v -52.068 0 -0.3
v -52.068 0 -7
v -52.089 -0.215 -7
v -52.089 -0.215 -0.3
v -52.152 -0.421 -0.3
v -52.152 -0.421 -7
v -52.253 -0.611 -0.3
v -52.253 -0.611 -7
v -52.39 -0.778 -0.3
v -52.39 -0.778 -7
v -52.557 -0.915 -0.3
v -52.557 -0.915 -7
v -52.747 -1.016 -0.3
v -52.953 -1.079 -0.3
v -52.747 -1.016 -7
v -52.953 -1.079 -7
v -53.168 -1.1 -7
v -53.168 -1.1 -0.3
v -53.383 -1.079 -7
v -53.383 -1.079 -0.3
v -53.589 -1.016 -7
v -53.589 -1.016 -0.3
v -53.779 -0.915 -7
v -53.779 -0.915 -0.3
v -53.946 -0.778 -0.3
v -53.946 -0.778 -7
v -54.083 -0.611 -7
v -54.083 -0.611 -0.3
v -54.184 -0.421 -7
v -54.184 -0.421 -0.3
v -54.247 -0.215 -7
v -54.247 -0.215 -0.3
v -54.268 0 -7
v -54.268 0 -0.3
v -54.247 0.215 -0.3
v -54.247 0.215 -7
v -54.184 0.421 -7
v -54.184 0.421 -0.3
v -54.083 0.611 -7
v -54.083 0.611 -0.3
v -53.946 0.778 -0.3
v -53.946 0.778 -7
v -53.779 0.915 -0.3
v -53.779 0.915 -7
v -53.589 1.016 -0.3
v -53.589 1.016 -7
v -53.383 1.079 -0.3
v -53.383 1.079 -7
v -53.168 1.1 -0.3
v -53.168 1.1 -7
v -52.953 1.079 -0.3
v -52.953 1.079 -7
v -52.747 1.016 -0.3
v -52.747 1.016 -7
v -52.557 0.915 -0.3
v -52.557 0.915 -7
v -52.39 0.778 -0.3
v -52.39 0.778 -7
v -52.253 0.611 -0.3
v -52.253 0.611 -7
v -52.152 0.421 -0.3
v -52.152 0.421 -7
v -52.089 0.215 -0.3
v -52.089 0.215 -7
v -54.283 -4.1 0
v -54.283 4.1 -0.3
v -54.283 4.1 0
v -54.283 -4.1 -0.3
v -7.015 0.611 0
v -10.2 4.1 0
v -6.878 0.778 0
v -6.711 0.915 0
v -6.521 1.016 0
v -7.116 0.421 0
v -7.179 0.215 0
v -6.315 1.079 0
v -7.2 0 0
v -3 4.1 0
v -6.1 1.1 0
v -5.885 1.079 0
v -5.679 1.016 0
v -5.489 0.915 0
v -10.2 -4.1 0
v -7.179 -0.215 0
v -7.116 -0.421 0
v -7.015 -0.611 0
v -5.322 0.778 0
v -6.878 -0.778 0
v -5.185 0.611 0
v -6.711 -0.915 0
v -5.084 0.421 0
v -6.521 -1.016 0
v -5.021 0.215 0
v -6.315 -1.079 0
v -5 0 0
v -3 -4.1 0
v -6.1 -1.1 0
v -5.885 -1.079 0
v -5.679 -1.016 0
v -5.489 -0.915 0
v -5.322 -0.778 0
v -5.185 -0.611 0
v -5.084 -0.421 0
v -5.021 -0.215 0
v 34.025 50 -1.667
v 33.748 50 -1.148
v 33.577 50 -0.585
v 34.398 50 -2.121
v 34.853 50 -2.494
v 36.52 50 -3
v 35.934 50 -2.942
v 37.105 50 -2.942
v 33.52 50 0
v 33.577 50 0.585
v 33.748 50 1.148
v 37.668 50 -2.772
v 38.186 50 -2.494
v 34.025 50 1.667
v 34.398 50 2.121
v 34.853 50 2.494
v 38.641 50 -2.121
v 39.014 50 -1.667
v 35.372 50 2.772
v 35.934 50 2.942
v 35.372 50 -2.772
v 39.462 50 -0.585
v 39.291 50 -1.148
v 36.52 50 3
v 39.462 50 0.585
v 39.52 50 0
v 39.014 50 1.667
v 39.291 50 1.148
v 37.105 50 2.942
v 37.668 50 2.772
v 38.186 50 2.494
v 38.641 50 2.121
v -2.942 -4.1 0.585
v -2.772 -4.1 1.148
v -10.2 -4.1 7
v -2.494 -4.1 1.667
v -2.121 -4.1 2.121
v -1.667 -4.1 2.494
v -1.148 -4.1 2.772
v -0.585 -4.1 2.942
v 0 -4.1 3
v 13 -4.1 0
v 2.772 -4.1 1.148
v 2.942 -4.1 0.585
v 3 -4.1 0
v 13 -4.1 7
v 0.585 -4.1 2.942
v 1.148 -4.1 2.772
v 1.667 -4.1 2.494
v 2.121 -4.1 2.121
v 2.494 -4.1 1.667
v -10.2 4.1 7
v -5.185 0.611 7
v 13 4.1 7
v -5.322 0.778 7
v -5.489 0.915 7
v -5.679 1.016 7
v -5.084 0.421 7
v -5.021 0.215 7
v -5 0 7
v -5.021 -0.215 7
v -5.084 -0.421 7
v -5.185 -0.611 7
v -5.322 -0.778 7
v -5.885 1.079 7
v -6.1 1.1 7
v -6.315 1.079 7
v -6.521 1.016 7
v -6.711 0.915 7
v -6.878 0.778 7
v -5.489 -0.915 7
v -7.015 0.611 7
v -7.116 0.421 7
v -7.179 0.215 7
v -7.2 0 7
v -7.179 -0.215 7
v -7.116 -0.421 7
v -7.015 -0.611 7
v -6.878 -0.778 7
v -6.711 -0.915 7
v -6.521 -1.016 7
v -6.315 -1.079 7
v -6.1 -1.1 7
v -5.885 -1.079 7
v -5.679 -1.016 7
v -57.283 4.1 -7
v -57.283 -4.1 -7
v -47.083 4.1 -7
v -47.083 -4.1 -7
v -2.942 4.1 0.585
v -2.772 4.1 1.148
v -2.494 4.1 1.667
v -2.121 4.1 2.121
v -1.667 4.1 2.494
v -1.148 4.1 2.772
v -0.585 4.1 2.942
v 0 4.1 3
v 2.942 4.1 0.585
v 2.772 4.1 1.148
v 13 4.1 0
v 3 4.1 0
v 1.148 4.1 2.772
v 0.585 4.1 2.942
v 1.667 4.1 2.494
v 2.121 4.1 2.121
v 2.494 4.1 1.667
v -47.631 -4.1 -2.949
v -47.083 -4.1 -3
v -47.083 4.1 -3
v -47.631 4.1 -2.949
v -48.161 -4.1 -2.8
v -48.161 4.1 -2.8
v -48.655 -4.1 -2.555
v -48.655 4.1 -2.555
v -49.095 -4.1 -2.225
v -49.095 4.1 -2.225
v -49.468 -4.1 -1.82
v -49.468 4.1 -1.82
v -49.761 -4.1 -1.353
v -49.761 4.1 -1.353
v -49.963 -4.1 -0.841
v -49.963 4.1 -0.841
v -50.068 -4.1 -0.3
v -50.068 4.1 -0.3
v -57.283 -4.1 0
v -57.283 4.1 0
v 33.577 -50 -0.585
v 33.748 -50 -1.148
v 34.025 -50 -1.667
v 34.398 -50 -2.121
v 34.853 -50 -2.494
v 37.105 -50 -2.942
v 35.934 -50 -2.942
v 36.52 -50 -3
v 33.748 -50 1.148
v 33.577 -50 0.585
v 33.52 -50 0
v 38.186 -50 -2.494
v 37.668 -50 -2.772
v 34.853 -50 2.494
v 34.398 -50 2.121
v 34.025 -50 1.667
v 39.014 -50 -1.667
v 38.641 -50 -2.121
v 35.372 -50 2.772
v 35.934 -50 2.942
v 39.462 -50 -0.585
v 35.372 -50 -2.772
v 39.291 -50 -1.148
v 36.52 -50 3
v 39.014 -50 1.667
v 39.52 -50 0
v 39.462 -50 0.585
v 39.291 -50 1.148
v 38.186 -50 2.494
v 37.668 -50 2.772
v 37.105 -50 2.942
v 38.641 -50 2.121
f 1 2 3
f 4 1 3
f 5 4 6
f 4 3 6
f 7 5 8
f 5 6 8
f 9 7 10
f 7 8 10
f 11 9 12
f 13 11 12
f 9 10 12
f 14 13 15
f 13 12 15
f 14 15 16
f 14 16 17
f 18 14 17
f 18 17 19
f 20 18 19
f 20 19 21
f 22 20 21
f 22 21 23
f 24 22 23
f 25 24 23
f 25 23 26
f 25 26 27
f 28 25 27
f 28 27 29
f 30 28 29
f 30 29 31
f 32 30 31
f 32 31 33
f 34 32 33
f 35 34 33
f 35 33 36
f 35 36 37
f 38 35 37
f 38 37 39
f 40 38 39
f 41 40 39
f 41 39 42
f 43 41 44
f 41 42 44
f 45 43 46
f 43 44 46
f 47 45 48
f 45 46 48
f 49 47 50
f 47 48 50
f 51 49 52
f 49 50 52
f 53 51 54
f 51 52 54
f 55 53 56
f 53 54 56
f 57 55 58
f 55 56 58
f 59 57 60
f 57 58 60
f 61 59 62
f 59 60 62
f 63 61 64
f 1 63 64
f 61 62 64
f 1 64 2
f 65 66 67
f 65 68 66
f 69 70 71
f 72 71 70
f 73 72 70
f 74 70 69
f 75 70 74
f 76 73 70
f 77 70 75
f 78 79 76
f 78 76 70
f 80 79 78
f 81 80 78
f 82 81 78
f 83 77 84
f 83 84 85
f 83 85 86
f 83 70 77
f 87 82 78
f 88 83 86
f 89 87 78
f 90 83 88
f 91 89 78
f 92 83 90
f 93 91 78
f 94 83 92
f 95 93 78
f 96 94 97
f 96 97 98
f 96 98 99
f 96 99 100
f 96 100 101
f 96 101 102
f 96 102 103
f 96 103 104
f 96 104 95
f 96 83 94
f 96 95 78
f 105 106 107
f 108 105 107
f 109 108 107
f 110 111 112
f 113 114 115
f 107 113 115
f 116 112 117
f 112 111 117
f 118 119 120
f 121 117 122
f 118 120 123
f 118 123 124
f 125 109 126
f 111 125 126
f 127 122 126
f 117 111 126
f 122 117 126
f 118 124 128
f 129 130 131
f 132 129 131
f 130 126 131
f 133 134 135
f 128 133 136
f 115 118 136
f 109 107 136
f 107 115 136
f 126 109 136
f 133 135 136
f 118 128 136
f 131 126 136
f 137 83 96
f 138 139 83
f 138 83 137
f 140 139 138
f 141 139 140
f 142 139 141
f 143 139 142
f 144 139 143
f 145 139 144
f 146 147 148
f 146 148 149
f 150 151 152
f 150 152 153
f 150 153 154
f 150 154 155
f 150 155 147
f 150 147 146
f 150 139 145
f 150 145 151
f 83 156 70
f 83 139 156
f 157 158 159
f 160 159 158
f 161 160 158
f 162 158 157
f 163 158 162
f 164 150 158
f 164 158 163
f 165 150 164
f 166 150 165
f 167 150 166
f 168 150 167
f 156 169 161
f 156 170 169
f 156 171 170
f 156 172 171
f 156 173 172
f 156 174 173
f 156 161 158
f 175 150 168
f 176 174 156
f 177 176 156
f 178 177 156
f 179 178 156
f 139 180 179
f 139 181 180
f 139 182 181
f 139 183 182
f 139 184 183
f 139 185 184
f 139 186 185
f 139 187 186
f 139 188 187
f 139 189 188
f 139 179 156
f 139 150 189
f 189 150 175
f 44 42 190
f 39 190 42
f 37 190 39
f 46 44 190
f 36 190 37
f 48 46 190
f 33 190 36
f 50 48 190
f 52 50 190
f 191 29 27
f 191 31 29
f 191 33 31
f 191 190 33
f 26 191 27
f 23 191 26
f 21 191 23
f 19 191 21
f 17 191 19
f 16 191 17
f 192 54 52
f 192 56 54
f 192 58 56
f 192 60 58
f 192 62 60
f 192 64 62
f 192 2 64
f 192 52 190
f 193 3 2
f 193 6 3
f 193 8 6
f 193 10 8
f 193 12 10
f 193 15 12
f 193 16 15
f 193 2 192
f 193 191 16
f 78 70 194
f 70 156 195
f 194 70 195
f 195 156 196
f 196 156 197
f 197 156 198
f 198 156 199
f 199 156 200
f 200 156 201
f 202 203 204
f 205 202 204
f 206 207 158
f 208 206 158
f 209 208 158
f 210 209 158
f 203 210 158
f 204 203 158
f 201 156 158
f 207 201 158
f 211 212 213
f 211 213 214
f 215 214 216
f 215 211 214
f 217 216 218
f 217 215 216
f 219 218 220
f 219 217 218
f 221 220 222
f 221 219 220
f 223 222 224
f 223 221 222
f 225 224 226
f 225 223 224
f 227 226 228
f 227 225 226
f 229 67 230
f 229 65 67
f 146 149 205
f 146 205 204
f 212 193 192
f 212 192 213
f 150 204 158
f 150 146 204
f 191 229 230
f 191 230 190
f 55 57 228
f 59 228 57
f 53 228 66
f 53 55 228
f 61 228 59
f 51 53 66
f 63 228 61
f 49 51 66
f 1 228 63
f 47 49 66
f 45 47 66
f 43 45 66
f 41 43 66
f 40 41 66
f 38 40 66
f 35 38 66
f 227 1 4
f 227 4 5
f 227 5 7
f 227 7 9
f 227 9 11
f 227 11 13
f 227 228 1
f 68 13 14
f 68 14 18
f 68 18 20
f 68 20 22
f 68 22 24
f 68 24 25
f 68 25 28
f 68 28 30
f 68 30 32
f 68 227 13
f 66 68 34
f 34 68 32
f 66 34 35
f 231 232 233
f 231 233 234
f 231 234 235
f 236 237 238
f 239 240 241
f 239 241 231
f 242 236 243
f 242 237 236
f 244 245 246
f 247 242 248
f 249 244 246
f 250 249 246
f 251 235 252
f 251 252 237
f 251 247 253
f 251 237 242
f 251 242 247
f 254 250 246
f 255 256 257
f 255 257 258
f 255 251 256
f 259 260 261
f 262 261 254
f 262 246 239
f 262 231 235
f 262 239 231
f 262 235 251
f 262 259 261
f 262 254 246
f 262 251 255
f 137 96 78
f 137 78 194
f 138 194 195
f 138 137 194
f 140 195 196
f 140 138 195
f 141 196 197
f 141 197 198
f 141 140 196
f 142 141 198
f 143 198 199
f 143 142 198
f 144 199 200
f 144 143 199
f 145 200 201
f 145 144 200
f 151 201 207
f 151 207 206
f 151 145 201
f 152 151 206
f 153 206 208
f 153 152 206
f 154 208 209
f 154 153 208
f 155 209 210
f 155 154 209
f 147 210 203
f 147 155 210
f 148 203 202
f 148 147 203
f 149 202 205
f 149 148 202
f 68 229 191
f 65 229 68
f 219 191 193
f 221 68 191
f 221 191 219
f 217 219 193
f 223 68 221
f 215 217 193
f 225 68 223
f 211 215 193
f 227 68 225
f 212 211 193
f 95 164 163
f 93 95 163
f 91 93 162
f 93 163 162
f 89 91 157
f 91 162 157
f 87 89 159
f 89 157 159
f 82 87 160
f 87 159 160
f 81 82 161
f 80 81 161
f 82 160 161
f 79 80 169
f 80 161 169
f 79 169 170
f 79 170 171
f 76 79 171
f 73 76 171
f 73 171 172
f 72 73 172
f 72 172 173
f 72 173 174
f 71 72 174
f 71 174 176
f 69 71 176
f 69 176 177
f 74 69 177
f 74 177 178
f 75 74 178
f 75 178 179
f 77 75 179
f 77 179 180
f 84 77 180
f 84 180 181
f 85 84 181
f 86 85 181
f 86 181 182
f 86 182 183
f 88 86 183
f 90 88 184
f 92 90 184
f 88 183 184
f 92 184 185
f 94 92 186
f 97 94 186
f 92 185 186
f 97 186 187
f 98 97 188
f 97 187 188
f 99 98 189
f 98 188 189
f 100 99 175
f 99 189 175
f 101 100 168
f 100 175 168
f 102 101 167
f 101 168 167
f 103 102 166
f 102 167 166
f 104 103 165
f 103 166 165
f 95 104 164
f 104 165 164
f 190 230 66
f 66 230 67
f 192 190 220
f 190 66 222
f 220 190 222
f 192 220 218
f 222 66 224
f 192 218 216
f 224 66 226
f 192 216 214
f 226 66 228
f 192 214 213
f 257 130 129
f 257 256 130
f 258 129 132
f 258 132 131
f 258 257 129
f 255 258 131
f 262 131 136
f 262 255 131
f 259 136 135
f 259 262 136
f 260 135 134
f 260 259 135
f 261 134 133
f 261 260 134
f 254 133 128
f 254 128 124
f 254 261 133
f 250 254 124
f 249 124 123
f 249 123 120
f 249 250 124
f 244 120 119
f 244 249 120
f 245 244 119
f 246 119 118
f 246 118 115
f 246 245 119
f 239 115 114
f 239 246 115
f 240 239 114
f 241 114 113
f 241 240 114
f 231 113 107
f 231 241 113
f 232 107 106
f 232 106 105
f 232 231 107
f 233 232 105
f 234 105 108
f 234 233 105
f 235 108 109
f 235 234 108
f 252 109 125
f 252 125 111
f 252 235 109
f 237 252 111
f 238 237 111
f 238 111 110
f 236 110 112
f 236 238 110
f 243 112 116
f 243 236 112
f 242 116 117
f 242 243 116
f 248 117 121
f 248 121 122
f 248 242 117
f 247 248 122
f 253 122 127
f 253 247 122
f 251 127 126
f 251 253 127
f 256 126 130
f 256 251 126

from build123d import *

# Parameters (mm, degrees)
F4_DEPTH  = 4.1
F5_R      = 1.1
F6_DEPTH  = 7.001
F8_DEPTH  = 4.1
F9_R      = 3
F10_DEPTH = 50
F11_R     = 1.1
F12_DEPTH = 14.001


with BuildPart() as f4:
    # F3 (on Front) → F4 (new body, symmetric)
    with BuildSketch(Plane.XZ):
        with BuildLine():
            Line((-10.2, 7), (-10.2, 0))
            Line((-10.2, 0), (-3, 0))
            ThreePointArc((-3, 0), (0, 3), (3, 0))
            Line((3, 0), (13, 0))
            Line((13, 0), (13, 7))
            Line((13, 7), (-10.2, 7))
        make_face()
    extrude(amount=F4_DEPTH, both=True)

    # F5 (on face) → F6 (cut, through all)
    with BuildSketch(Plane.XY.offset(7)):
        with Locations((-6.1, 0)):
            Circle(F5_R)
    extrude(amount=-F6_DEPTH, mode=Mode.SUBTRACT)


with BuildPart() as f8:
    # F7 (on Front) → F8 (new body, symmetric)
    with BuildSketch(Plane.XZ):
        with BuildLine():
            Line((-54.2830354646, 0), (-57.2830354646, 0))
            Line((-57.2830354646, 0), (-57.2830354646, -7))
            Line((-57.2830354646, -7), (-47.0830354646, -7))
            Line((-47.0830354646, -7), (-47.0830354646, -3))
            ThreePointArc((-47.0830354646, -3), (-49.0954966443, -2.2248595461), (-50.0679977759, -0.3))
            Line((-50.0679977759, -0.3), (-54.2830354646, -0.3))
            Line((-54.2830354646, -0.3), (-54.2830354646, 0))
        make_face()
    extrude(amount=F8_DEPTH, both=True)

    # F11 (on face) → F12 (cut, through all)
    with BuildSketch(Plane(origin=(0, 0, -7), x_dir=(1, 0, 0), z_dir=(0, 0, -1))):
        with Locations((-53.1679977759, 0)):
            Circle(F11_R)
    extrude(amount=-F12_DEPTH, mode=Mode.SUBTRACT)


with BuildPart() as f10:
    # F9 (on Front) → F10 (new body, symmetric)
    with BuildSketch(Plane.XZ):
        with Locations((36.5195933817, 0)):
            Circle(F9_R)
    extrude(amount=F10_DEPTH, both=True)


solid = Compound([f4.part, f8.part, f10.part])
